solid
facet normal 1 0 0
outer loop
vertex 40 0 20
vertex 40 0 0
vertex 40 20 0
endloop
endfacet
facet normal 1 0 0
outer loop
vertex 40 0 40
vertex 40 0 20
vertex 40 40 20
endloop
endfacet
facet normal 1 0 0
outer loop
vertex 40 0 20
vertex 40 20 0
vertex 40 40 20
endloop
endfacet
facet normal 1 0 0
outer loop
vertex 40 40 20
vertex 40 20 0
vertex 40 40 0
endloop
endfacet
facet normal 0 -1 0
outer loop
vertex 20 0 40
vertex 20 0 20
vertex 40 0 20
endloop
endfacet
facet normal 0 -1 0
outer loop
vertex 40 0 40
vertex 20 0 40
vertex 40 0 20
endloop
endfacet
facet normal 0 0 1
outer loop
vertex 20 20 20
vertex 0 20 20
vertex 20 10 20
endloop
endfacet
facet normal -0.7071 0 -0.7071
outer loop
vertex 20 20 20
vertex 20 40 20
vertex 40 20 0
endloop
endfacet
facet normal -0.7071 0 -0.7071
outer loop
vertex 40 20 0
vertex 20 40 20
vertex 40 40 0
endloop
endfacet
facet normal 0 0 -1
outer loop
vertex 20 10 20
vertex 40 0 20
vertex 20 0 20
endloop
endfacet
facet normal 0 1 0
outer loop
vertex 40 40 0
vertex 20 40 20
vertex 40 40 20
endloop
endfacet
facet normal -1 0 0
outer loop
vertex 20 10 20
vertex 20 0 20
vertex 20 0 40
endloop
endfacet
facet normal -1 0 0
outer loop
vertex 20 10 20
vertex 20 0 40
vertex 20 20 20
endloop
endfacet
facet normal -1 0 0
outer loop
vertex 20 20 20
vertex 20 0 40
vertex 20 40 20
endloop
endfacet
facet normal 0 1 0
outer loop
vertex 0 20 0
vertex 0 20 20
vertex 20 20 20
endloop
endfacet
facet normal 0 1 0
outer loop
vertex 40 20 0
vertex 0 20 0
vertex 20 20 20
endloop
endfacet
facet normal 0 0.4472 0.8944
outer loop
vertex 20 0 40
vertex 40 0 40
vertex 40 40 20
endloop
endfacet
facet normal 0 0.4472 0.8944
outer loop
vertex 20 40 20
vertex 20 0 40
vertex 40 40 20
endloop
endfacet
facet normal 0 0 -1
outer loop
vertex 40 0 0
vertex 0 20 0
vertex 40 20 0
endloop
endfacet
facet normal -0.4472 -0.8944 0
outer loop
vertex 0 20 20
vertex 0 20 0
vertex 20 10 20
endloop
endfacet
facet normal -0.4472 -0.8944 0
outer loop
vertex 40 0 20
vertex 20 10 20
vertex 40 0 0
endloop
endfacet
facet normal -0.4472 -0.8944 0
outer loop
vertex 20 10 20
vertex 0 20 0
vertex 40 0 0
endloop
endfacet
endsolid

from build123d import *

# Parameters (mm, degrees)
SKETCH1_W           = 40
SKETCH1_H           = 40
BOSS_EXTRUDE1_DEPTH = 40
SKETCH2_W           = 20
SKETCH2_H           = 20
CUT_EXTRUDE1_DEPTH  = 40
CUT_EXTRUDE2_DEPTH  = 40
CUT_EXTRUDE3_DEPTH  = 40
SKETCH5_W           = 20
SKETCH5_H           = 20
CUT_EXTRUDE4_DEPTH  = 40
CUT_EXTRUDE5_DEPTH  = 20
CUT_EXTRUDE13_DEPTH = 20


with BuildPart() as part:
    # Sketch1 → Boss-Extrude1 (new body)
    with BuildSketch(Plane.XY):
        with Locations((20, 20)):
            Rectangle(SKETCH1_W, SKETCH1_H)
    extrude(amount=BOSS_EXTRUDE1_DEPTH)

    # Sketch2 → Cut-Extrude1 (cut)
    with BuildSketch(Plane.XY.offset(40)):
        with Locations((10, 30)):
            Rectangle(SKETCH2_W, SKETCH2_H)
    extrude(amount=-CUT_EXTRUDE1_DEPTH, mode=Mode.SUBTRACT)

    # Sketch3 → Cut-Extrude2 (cut)
    with BuildSketch(Plane.XY.offset(40)):
        Polygon((0, 0), (20, 0), (20, 10), (0, 20), align=None)
    extrude(amount=-CUT_EXTRUDE2_DEPTH, mode=Mode.SUBTRACT)

    # Sketch4 → Cut-Extrude3 (cut)
    with BuildSketch(Plane(origin=(40, 0, 0), x_dir=(0, 0, -1), z_dir=(1, 0, 0))):
        Polygon((-40, 0), (-20, 40), (-40, 40), align=None)
    extrude(amount=-CUT_EXTRUDE3_DEPTH, mode=Mode.SUBTRACT)

    # Sketch5 → Cut-Extrude4 (cut)
    with BuildSketch(Plane.XZ):
        with Locations((10, 30)):
            Rectangle(SKETCH5_W, SKETCH5_H)
    extrude(amount=-CUT_EXTRUDE4_DEPTH, mode=Mode.SUBTRACT)

    # Sketch6 → Cut-Extrude5 (cut)
    with BuildSketch(Plane(origin=(0, 0, 0), x_dir=(-1, 0, 0), z_dir=(0, 0, -1))):
        Polygon((-20, 10), (-40, 0), (-20, 0), align=None)
    extrude(amount=-CUT_EXTRUDE5_DEPTH, mode=Mode.SUBTRACT)

    # Sketch9 → Cut-Extrude13 (cut)
    with BuildSketch(Plane(origin=(0, 40, 0), x_dir=(1, 0, 0), z_dir=(0, 1, 0))):
        Polygon((20, -20), (40, 0), (20, 0), align=None)
    extrude(amount=-CUT_EXTRUDE13_DEPTH, mode=Mode.SUBTRACT)


solid = part.part
